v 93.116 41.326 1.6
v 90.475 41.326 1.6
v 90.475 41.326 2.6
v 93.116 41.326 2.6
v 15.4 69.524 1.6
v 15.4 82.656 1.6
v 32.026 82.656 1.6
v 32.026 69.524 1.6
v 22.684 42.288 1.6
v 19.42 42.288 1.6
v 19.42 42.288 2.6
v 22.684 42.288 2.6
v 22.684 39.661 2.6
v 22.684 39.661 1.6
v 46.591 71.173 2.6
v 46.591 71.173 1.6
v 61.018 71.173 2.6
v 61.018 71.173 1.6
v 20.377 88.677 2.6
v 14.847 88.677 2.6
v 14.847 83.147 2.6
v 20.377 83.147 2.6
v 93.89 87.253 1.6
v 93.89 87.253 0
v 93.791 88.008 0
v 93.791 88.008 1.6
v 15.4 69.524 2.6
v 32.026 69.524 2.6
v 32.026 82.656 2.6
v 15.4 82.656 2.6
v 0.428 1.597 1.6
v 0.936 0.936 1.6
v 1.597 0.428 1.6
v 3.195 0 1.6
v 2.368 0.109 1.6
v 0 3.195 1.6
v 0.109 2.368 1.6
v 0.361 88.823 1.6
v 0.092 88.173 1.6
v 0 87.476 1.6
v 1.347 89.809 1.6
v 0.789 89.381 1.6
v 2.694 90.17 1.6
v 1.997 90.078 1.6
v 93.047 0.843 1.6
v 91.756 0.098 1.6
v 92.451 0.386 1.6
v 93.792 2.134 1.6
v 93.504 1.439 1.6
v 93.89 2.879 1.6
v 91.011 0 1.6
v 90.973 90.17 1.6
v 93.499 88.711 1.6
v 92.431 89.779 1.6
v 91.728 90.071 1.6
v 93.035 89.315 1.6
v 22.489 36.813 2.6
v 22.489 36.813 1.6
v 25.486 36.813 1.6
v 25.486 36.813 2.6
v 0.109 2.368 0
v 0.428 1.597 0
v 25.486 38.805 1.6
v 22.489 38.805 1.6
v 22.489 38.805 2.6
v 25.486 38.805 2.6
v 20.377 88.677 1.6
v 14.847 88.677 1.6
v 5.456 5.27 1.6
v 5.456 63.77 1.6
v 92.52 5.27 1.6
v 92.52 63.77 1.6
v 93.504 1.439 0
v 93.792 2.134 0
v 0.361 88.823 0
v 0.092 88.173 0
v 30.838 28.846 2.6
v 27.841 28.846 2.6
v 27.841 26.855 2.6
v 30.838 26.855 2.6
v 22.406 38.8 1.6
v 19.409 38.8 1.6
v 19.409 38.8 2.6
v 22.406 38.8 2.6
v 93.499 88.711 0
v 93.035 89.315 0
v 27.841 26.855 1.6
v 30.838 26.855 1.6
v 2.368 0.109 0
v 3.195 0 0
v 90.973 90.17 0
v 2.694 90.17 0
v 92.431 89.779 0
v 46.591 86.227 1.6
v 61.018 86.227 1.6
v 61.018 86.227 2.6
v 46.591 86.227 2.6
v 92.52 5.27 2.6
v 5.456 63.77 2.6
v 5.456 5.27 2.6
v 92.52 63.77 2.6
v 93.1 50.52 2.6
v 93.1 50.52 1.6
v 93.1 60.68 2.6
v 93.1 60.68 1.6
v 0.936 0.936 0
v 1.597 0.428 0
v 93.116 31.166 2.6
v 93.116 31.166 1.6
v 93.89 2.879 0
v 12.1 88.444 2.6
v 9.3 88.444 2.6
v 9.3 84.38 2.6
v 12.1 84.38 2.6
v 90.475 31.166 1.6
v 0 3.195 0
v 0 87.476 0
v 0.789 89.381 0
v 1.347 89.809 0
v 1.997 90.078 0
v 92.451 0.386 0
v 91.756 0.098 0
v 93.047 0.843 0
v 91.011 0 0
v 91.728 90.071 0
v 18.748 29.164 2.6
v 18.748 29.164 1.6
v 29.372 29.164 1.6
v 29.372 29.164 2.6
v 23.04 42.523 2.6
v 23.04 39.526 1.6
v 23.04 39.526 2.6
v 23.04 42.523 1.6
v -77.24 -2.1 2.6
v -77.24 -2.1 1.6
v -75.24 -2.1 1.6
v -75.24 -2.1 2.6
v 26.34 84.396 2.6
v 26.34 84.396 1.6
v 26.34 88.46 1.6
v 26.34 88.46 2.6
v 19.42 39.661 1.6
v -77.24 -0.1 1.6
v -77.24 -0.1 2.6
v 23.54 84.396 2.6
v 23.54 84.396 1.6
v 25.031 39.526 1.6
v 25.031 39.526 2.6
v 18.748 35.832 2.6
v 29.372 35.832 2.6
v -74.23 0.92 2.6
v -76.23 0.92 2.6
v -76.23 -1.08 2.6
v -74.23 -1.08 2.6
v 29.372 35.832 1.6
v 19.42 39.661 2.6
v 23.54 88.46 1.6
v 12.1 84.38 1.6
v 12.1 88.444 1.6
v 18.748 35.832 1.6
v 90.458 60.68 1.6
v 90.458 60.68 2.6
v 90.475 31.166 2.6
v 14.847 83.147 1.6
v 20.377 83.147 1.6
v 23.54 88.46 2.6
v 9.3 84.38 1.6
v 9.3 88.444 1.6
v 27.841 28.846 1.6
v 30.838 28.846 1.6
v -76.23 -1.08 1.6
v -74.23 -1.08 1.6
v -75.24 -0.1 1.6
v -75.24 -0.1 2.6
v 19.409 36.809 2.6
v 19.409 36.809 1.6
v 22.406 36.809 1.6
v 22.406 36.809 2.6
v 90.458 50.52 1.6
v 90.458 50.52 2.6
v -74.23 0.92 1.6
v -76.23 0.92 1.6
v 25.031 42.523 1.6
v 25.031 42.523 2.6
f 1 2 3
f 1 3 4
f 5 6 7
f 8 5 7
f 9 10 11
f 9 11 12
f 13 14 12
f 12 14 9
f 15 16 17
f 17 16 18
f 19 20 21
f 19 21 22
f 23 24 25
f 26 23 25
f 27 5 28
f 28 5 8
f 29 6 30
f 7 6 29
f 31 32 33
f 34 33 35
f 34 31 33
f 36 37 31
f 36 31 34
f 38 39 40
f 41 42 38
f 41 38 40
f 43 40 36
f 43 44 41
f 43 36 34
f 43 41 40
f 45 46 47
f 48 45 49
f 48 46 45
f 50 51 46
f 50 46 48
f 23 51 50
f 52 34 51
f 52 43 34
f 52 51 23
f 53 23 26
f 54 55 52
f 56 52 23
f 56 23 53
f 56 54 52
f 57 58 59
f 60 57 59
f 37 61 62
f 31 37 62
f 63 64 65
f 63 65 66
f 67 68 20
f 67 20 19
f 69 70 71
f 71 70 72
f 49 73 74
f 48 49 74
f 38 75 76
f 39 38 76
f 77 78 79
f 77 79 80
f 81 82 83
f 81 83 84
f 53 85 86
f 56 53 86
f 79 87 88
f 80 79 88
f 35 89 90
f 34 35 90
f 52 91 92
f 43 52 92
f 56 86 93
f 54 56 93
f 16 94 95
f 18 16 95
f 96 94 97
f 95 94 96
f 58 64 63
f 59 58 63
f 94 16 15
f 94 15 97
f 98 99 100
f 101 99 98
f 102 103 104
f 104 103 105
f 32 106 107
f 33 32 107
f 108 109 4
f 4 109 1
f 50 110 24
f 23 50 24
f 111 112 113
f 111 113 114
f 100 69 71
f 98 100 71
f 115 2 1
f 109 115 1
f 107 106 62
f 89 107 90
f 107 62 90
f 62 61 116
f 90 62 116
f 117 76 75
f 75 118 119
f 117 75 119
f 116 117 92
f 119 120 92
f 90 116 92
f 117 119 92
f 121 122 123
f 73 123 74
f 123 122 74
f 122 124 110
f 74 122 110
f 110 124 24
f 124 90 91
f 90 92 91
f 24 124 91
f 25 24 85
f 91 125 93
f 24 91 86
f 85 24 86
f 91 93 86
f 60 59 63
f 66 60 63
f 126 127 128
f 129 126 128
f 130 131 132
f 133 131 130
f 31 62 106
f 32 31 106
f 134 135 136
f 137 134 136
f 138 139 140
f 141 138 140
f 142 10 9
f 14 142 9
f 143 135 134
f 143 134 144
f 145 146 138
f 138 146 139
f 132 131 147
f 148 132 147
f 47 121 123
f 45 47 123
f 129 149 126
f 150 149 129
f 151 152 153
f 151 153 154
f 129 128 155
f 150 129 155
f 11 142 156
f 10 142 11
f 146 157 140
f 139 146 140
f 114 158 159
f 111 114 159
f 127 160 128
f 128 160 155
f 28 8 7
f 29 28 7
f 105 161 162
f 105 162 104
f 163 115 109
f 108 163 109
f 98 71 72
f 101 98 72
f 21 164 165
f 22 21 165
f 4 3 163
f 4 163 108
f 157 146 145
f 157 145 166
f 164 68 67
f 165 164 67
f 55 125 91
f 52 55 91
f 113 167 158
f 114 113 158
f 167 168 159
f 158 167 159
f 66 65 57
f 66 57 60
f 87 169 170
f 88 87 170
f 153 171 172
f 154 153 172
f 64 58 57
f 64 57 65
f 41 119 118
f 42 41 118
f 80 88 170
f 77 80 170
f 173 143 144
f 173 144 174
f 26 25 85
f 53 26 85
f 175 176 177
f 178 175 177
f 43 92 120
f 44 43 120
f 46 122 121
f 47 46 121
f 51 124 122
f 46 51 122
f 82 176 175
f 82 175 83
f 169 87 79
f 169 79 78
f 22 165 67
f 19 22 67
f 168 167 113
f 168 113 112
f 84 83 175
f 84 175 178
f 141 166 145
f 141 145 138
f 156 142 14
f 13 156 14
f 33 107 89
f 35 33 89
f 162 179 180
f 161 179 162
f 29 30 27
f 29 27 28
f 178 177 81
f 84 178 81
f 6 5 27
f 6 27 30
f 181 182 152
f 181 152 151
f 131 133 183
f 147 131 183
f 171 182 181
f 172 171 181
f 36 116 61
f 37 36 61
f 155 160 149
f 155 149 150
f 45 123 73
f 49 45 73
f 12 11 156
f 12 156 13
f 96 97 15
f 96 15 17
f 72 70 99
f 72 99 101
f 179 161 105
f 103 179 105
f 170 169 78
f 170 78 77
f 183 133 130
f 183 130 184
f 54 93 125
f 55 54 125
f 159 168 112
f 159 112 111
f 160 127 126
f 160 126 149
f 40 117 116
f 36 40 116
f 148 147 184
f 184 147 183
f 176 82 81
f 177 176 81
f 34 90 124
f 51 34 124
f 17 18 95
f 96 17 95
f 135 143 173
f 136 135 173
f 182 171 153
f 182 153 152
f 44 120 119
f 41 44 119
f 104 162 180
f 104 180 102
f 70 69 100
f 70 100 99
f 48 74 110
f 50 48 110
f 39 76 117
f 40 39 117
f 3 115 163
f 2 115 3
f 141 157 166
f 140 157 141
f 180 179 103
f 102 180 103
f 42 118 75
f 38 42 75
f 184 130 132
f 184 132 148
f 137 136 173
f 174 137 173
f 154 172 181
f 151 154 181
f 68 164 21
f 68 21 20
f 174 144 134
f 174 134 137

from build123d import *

# Parameters (mm, degrees)
BOARD_DEPTH                 = 1.6
ESQUISSE2_W                 = 1.9914
ESQUISSE2_H                 = 2.9968
F_0603_CAP_1_DEPTH          = 1
ESQUISSE3_W                 = 2.9968
ESQUISSE3_H                 = 1.9914
F_0603_CAP_2_DEPTH          = 1
ESQUISSE4_W                 = 2.9968
ESQUISSE4_H                 = 1.9914
F_0603_CAP_3_DEPTH          = 1
ESQUISSE5_W                 = 2.9968
ESQUISSE5_H                 = 1.9914
F_0603_CAP_4_DEPTH          = 1
ESQUISSE6_W                 = 2
ESQUISSE6_H                 = 2
DUMMY_1_DEPTH               = 1
ESQUISSE7_W                 = 2
ESQUISSE7_H                 = 2
DUMMY_2_DEPTH               = 1
ESQUISSE8_W                 = 2.8
ESQUISSE8_H                 = 4.0635
U_FL_1_DEPTH                = 1
ESQUISSE9_W                 = 2.8
ESQUISSE9_H                 = 4.0635
U_FL_2_DEPTH                = 1
ESQUISSE10_W                = 2.6416
ESQUISSE10_H                = 10.16
EXTRUDE_1X04_1_DEPTH        = 1
ESQUISSE11_W                = 2.6416
ESQUISSE11_H                = 10.16
EXTRUDE_1X04_2_DEPTH        = 1
ESQUISSE14_W                = 87.0635
ESQUISSE14_H                = 58.5
RPI3_1_DEPTH                = 1
ESQUISSE15_W                = 10.623856
ESQUISSE15_H                = 6.6675
SO016_1_DEPTH               = 1
ESQUISSE16_W                = 5.5302
ESQUISSE16_H                = 5.5302
QFN32_5X5MM_1_DEPTH         = 1
ESQUISSE17_W                = 16.625597
ESQUISSE17_H                = 13.1318
S1216_24PIN_PACKAGE_1_DEPTH = 1
ESQUISSE18_W                = 14.427
ESQUISSE18_H                = 15.054
PN87520_1_DEPTH             = 1
ESQUISSE19_W                = 3.2635
ESQUISSE19_H                = 2.627
CRYSTAL_SMD_3_2X2_5_1_DEPTH = 1


with BuildPart() as part:
    # Esquisse1 → BOARD (new body)
    with BuildSketch(Plane.XY):
        Polygon((0, 87.475991), (0, 3.194544), (0.108851, 2.367735), (0.427988, 1.597272), (0.93566, 0.93566), (1.597272, 0.427988), (2.367735, 0.108851), (3.194544, 0), (91.011053, 0), (91.756179, 0.098098), (92.450527, 0.385706), (93.046776, 0.843224), (93.504294, 1.439473), (93.791902, 2.133821), (93.89, 2.878947), (93.89, 87.252531), (93.79059, 88.007628), (93.499133, 88.711266), (93.035493, 89.315493), (92.431266, 89.779133), (91.727628, 90.07059), (90.972531, 90.17), (2.694009, 90.17), (1.996748, 90.078204), (1.347005, 89.809071), (0.789057, 89.380943), (0.360929, 88.822995), (0.091796, 88.173252), align=None)
    extrude(amount=BOARD_DEPTH)


with BuildPart() as body_2:
    # Esquisse2 → 0603-CAP-1 (new body)
    with BuildSketch(Plane.XY.offset(1.6)):
        with Locations((24.0353, 41.0246)):
            Rectangle(ESQUISSE2_W, ESQUISSE2_H)
    extrude(amount=F_0603_CAP_1_DEPTH)


with BuildPart() as body_3:
    # Esquisse3 → 0603-CAP-2 (new body)
    with BuildSketch(Plane.XY.offset(1.6)):
        with Locations((20.9072, 37.8045)):
            Rectangle(ESQUISSE3_W, ESQUISSE3_H)
    extrude(amount=F_0603_CAP_2_DEPTH)


with BuildPart() as body_4:
    # Esquisse4 → 0603-CAP-3 (new body)
    with BuildSketch(Plane.XY.offset(1.6)):
        with Locations((23.9876, 37.8091)):
            Rectangle(ESQUISSE4_W, ESQUISSE4_H)
    extrude(amount=F_0603_CAP_3_DEPTH)


with BuildPart() as body_5:
    # Esquisse5 → 0603-CAP-4 (new body)
    with BuildSketch(Plane.XY.offset(1.6)):
        with Locations((29.3398, 27.8507)):
            Rectangle(ESQUISSE5_W, ESQUISSE5_H)
    extrude(amount=F_0603_CAP_4_DEPTH)


with BuildPart() as body_6:
    # Esquisse6 → DUMMY-1 (new body)
    with BuildSketch(Plane.XY.offset(1.6)):
        with Locations((-75.23, -0.08)):
            Rectangle(ESQUISSE6_W, ESQUISSE6_H)
    extrude(amount=DUMMY_1_DEPTH)


with BuildPart() as body_7:
    # Esquisse7 → DUMMY-2 (new body)
    with BuildSketch(Plane.XY.offset(1.6)):
        with Locations((-76.24, -1.1)):
            Rectangle(ESQUISSE7_W, ESQUISSE7_H)
    extrude(amount=DUMMY_2_DEPTH)


with BuildPart() as body_8:
    # Esquisse8 → U_FL-1 (new body)
    with BuildSketch(Plane.XY.offset(1.6)):
        with Locations((24.94, 86.42825)):
            Rectangle(ESQUISSE8_W, ESQUISSE8_H)
    extrude(amount=U_FL_1_DEPTH)


with BuildPart() as body_9:
    # Esquisse9 → U_FL-2 (new body)
    with BuildSketch(Plane.XY.offset(1.6)):
        with Locations((10.7, 86.41175)):
            Rectangle(ESQUISSE9_W, ESQUISSE9_H)
    extrude(amount=U_FL_2_DEPTH)


with BuildPart() as body_10:
    # Esquisse10 → 1X04-1 (new body)
    with BuildSketch(Plane.XY.offset(1.6)):
        with Locations((91.7792, 55.6)):
            Rectangle(ESQUISSE10_W, ESQUISSE10_H)
    extrude(amount=EXTRUDE_1X04_1_DEPTH)


with BuildPart() as body_11:
    # Esquisse11 → 1X04-2 (new body)
    with BuildSketch(Plane.XY.offset(1.6)):
        with Locations((91.7956, 36.2458)):
            Rectangle(ESQUISSE11_W, ESQUISSE11_H)
    extrude(amount=EXTRUDE_1X04_2_DEPTH)


with BuildPart() as body_12:
    # Esquisse14 → RPI3-1 (new body)
    with BuildSketch(Plane.XY.offset(1.6)):
        with Locations((48.98825, 34.52)):
            Rectangle(ESQUISSE14_W, ESQUISSE14_H)
    extrude(amount=RPI3_1_DEPTH)


with BuildPart() as body_13:
    # Esquisse15 → SO016-1 (new body)
    with BuildSketch(Plane.XY.offset(1.6)):
        with Locations((24.060372, 32.49825)):
            Rectangle(ESQUISSE15_W, ESQUISSE15_H)
    extrude(amount=SO016_1_DEPTH)


with BuildPart() as body_14:
    # Esquisse16 → QFN32-5X5MM-1 (new body)
    with BuildSketch(Plane.XY.offset(1.6)):
        with Locations((17.6119, 85.9119)):
            Rectangle(ESQUISSE16_W, ESQUISSE16_H)
    extrude(amount=QFN32_5X5MM_1_DEPTH)


with BuildPart() as body_15:
    # Esquisse17 → S1216_24PIN_PACKAGE-1 (new body)
    with BuildSketch(Plane.XY.offset(1.6)):
        with Locations((23.7128015, 76.0897)):
            Rectangle(ESQUISSE17_W, ESQUISSE17_H)
    extrude(amount=S1216_24PIN_PACKAGE_1_DEPTH)


with BuildPart() as body_16:
    # Esquisse18 → PN87520-1 (new body)
    with BuildSketch(Plane.XY.offset(1.6)):
        with Locations((53.8049, 78.7004)):
            Rectangle(ESQUISSE18_W, ESQUISSE18_H)
    extrude(amount=PN87520_1_DEPTH)


with BuildPart() as body_17:
    # Esquisse19 → CRYSTAL-SMD-3_2X2_5-1 (new body)
    with BuildSketch(Plane.XY.offset(1.6)):
        with Locations((21.05175, 40.9742)):
            Rectangle(ESQUISSE19_W, ESQUISSE19_H)
    extrude(amount=CRYSTAL_SMD_3_2X2_5_1_DEPTH)


solid = Compound([part.part, body_2.part, body_3.part, body_4.part, body_5.part, body_6.part, body_7.part, body_8.part, body_9.part, body_10.part, body_11.part, body_12.part, body_13.part, body_14.part, body_15.part, body_16.part, body_17.part])
